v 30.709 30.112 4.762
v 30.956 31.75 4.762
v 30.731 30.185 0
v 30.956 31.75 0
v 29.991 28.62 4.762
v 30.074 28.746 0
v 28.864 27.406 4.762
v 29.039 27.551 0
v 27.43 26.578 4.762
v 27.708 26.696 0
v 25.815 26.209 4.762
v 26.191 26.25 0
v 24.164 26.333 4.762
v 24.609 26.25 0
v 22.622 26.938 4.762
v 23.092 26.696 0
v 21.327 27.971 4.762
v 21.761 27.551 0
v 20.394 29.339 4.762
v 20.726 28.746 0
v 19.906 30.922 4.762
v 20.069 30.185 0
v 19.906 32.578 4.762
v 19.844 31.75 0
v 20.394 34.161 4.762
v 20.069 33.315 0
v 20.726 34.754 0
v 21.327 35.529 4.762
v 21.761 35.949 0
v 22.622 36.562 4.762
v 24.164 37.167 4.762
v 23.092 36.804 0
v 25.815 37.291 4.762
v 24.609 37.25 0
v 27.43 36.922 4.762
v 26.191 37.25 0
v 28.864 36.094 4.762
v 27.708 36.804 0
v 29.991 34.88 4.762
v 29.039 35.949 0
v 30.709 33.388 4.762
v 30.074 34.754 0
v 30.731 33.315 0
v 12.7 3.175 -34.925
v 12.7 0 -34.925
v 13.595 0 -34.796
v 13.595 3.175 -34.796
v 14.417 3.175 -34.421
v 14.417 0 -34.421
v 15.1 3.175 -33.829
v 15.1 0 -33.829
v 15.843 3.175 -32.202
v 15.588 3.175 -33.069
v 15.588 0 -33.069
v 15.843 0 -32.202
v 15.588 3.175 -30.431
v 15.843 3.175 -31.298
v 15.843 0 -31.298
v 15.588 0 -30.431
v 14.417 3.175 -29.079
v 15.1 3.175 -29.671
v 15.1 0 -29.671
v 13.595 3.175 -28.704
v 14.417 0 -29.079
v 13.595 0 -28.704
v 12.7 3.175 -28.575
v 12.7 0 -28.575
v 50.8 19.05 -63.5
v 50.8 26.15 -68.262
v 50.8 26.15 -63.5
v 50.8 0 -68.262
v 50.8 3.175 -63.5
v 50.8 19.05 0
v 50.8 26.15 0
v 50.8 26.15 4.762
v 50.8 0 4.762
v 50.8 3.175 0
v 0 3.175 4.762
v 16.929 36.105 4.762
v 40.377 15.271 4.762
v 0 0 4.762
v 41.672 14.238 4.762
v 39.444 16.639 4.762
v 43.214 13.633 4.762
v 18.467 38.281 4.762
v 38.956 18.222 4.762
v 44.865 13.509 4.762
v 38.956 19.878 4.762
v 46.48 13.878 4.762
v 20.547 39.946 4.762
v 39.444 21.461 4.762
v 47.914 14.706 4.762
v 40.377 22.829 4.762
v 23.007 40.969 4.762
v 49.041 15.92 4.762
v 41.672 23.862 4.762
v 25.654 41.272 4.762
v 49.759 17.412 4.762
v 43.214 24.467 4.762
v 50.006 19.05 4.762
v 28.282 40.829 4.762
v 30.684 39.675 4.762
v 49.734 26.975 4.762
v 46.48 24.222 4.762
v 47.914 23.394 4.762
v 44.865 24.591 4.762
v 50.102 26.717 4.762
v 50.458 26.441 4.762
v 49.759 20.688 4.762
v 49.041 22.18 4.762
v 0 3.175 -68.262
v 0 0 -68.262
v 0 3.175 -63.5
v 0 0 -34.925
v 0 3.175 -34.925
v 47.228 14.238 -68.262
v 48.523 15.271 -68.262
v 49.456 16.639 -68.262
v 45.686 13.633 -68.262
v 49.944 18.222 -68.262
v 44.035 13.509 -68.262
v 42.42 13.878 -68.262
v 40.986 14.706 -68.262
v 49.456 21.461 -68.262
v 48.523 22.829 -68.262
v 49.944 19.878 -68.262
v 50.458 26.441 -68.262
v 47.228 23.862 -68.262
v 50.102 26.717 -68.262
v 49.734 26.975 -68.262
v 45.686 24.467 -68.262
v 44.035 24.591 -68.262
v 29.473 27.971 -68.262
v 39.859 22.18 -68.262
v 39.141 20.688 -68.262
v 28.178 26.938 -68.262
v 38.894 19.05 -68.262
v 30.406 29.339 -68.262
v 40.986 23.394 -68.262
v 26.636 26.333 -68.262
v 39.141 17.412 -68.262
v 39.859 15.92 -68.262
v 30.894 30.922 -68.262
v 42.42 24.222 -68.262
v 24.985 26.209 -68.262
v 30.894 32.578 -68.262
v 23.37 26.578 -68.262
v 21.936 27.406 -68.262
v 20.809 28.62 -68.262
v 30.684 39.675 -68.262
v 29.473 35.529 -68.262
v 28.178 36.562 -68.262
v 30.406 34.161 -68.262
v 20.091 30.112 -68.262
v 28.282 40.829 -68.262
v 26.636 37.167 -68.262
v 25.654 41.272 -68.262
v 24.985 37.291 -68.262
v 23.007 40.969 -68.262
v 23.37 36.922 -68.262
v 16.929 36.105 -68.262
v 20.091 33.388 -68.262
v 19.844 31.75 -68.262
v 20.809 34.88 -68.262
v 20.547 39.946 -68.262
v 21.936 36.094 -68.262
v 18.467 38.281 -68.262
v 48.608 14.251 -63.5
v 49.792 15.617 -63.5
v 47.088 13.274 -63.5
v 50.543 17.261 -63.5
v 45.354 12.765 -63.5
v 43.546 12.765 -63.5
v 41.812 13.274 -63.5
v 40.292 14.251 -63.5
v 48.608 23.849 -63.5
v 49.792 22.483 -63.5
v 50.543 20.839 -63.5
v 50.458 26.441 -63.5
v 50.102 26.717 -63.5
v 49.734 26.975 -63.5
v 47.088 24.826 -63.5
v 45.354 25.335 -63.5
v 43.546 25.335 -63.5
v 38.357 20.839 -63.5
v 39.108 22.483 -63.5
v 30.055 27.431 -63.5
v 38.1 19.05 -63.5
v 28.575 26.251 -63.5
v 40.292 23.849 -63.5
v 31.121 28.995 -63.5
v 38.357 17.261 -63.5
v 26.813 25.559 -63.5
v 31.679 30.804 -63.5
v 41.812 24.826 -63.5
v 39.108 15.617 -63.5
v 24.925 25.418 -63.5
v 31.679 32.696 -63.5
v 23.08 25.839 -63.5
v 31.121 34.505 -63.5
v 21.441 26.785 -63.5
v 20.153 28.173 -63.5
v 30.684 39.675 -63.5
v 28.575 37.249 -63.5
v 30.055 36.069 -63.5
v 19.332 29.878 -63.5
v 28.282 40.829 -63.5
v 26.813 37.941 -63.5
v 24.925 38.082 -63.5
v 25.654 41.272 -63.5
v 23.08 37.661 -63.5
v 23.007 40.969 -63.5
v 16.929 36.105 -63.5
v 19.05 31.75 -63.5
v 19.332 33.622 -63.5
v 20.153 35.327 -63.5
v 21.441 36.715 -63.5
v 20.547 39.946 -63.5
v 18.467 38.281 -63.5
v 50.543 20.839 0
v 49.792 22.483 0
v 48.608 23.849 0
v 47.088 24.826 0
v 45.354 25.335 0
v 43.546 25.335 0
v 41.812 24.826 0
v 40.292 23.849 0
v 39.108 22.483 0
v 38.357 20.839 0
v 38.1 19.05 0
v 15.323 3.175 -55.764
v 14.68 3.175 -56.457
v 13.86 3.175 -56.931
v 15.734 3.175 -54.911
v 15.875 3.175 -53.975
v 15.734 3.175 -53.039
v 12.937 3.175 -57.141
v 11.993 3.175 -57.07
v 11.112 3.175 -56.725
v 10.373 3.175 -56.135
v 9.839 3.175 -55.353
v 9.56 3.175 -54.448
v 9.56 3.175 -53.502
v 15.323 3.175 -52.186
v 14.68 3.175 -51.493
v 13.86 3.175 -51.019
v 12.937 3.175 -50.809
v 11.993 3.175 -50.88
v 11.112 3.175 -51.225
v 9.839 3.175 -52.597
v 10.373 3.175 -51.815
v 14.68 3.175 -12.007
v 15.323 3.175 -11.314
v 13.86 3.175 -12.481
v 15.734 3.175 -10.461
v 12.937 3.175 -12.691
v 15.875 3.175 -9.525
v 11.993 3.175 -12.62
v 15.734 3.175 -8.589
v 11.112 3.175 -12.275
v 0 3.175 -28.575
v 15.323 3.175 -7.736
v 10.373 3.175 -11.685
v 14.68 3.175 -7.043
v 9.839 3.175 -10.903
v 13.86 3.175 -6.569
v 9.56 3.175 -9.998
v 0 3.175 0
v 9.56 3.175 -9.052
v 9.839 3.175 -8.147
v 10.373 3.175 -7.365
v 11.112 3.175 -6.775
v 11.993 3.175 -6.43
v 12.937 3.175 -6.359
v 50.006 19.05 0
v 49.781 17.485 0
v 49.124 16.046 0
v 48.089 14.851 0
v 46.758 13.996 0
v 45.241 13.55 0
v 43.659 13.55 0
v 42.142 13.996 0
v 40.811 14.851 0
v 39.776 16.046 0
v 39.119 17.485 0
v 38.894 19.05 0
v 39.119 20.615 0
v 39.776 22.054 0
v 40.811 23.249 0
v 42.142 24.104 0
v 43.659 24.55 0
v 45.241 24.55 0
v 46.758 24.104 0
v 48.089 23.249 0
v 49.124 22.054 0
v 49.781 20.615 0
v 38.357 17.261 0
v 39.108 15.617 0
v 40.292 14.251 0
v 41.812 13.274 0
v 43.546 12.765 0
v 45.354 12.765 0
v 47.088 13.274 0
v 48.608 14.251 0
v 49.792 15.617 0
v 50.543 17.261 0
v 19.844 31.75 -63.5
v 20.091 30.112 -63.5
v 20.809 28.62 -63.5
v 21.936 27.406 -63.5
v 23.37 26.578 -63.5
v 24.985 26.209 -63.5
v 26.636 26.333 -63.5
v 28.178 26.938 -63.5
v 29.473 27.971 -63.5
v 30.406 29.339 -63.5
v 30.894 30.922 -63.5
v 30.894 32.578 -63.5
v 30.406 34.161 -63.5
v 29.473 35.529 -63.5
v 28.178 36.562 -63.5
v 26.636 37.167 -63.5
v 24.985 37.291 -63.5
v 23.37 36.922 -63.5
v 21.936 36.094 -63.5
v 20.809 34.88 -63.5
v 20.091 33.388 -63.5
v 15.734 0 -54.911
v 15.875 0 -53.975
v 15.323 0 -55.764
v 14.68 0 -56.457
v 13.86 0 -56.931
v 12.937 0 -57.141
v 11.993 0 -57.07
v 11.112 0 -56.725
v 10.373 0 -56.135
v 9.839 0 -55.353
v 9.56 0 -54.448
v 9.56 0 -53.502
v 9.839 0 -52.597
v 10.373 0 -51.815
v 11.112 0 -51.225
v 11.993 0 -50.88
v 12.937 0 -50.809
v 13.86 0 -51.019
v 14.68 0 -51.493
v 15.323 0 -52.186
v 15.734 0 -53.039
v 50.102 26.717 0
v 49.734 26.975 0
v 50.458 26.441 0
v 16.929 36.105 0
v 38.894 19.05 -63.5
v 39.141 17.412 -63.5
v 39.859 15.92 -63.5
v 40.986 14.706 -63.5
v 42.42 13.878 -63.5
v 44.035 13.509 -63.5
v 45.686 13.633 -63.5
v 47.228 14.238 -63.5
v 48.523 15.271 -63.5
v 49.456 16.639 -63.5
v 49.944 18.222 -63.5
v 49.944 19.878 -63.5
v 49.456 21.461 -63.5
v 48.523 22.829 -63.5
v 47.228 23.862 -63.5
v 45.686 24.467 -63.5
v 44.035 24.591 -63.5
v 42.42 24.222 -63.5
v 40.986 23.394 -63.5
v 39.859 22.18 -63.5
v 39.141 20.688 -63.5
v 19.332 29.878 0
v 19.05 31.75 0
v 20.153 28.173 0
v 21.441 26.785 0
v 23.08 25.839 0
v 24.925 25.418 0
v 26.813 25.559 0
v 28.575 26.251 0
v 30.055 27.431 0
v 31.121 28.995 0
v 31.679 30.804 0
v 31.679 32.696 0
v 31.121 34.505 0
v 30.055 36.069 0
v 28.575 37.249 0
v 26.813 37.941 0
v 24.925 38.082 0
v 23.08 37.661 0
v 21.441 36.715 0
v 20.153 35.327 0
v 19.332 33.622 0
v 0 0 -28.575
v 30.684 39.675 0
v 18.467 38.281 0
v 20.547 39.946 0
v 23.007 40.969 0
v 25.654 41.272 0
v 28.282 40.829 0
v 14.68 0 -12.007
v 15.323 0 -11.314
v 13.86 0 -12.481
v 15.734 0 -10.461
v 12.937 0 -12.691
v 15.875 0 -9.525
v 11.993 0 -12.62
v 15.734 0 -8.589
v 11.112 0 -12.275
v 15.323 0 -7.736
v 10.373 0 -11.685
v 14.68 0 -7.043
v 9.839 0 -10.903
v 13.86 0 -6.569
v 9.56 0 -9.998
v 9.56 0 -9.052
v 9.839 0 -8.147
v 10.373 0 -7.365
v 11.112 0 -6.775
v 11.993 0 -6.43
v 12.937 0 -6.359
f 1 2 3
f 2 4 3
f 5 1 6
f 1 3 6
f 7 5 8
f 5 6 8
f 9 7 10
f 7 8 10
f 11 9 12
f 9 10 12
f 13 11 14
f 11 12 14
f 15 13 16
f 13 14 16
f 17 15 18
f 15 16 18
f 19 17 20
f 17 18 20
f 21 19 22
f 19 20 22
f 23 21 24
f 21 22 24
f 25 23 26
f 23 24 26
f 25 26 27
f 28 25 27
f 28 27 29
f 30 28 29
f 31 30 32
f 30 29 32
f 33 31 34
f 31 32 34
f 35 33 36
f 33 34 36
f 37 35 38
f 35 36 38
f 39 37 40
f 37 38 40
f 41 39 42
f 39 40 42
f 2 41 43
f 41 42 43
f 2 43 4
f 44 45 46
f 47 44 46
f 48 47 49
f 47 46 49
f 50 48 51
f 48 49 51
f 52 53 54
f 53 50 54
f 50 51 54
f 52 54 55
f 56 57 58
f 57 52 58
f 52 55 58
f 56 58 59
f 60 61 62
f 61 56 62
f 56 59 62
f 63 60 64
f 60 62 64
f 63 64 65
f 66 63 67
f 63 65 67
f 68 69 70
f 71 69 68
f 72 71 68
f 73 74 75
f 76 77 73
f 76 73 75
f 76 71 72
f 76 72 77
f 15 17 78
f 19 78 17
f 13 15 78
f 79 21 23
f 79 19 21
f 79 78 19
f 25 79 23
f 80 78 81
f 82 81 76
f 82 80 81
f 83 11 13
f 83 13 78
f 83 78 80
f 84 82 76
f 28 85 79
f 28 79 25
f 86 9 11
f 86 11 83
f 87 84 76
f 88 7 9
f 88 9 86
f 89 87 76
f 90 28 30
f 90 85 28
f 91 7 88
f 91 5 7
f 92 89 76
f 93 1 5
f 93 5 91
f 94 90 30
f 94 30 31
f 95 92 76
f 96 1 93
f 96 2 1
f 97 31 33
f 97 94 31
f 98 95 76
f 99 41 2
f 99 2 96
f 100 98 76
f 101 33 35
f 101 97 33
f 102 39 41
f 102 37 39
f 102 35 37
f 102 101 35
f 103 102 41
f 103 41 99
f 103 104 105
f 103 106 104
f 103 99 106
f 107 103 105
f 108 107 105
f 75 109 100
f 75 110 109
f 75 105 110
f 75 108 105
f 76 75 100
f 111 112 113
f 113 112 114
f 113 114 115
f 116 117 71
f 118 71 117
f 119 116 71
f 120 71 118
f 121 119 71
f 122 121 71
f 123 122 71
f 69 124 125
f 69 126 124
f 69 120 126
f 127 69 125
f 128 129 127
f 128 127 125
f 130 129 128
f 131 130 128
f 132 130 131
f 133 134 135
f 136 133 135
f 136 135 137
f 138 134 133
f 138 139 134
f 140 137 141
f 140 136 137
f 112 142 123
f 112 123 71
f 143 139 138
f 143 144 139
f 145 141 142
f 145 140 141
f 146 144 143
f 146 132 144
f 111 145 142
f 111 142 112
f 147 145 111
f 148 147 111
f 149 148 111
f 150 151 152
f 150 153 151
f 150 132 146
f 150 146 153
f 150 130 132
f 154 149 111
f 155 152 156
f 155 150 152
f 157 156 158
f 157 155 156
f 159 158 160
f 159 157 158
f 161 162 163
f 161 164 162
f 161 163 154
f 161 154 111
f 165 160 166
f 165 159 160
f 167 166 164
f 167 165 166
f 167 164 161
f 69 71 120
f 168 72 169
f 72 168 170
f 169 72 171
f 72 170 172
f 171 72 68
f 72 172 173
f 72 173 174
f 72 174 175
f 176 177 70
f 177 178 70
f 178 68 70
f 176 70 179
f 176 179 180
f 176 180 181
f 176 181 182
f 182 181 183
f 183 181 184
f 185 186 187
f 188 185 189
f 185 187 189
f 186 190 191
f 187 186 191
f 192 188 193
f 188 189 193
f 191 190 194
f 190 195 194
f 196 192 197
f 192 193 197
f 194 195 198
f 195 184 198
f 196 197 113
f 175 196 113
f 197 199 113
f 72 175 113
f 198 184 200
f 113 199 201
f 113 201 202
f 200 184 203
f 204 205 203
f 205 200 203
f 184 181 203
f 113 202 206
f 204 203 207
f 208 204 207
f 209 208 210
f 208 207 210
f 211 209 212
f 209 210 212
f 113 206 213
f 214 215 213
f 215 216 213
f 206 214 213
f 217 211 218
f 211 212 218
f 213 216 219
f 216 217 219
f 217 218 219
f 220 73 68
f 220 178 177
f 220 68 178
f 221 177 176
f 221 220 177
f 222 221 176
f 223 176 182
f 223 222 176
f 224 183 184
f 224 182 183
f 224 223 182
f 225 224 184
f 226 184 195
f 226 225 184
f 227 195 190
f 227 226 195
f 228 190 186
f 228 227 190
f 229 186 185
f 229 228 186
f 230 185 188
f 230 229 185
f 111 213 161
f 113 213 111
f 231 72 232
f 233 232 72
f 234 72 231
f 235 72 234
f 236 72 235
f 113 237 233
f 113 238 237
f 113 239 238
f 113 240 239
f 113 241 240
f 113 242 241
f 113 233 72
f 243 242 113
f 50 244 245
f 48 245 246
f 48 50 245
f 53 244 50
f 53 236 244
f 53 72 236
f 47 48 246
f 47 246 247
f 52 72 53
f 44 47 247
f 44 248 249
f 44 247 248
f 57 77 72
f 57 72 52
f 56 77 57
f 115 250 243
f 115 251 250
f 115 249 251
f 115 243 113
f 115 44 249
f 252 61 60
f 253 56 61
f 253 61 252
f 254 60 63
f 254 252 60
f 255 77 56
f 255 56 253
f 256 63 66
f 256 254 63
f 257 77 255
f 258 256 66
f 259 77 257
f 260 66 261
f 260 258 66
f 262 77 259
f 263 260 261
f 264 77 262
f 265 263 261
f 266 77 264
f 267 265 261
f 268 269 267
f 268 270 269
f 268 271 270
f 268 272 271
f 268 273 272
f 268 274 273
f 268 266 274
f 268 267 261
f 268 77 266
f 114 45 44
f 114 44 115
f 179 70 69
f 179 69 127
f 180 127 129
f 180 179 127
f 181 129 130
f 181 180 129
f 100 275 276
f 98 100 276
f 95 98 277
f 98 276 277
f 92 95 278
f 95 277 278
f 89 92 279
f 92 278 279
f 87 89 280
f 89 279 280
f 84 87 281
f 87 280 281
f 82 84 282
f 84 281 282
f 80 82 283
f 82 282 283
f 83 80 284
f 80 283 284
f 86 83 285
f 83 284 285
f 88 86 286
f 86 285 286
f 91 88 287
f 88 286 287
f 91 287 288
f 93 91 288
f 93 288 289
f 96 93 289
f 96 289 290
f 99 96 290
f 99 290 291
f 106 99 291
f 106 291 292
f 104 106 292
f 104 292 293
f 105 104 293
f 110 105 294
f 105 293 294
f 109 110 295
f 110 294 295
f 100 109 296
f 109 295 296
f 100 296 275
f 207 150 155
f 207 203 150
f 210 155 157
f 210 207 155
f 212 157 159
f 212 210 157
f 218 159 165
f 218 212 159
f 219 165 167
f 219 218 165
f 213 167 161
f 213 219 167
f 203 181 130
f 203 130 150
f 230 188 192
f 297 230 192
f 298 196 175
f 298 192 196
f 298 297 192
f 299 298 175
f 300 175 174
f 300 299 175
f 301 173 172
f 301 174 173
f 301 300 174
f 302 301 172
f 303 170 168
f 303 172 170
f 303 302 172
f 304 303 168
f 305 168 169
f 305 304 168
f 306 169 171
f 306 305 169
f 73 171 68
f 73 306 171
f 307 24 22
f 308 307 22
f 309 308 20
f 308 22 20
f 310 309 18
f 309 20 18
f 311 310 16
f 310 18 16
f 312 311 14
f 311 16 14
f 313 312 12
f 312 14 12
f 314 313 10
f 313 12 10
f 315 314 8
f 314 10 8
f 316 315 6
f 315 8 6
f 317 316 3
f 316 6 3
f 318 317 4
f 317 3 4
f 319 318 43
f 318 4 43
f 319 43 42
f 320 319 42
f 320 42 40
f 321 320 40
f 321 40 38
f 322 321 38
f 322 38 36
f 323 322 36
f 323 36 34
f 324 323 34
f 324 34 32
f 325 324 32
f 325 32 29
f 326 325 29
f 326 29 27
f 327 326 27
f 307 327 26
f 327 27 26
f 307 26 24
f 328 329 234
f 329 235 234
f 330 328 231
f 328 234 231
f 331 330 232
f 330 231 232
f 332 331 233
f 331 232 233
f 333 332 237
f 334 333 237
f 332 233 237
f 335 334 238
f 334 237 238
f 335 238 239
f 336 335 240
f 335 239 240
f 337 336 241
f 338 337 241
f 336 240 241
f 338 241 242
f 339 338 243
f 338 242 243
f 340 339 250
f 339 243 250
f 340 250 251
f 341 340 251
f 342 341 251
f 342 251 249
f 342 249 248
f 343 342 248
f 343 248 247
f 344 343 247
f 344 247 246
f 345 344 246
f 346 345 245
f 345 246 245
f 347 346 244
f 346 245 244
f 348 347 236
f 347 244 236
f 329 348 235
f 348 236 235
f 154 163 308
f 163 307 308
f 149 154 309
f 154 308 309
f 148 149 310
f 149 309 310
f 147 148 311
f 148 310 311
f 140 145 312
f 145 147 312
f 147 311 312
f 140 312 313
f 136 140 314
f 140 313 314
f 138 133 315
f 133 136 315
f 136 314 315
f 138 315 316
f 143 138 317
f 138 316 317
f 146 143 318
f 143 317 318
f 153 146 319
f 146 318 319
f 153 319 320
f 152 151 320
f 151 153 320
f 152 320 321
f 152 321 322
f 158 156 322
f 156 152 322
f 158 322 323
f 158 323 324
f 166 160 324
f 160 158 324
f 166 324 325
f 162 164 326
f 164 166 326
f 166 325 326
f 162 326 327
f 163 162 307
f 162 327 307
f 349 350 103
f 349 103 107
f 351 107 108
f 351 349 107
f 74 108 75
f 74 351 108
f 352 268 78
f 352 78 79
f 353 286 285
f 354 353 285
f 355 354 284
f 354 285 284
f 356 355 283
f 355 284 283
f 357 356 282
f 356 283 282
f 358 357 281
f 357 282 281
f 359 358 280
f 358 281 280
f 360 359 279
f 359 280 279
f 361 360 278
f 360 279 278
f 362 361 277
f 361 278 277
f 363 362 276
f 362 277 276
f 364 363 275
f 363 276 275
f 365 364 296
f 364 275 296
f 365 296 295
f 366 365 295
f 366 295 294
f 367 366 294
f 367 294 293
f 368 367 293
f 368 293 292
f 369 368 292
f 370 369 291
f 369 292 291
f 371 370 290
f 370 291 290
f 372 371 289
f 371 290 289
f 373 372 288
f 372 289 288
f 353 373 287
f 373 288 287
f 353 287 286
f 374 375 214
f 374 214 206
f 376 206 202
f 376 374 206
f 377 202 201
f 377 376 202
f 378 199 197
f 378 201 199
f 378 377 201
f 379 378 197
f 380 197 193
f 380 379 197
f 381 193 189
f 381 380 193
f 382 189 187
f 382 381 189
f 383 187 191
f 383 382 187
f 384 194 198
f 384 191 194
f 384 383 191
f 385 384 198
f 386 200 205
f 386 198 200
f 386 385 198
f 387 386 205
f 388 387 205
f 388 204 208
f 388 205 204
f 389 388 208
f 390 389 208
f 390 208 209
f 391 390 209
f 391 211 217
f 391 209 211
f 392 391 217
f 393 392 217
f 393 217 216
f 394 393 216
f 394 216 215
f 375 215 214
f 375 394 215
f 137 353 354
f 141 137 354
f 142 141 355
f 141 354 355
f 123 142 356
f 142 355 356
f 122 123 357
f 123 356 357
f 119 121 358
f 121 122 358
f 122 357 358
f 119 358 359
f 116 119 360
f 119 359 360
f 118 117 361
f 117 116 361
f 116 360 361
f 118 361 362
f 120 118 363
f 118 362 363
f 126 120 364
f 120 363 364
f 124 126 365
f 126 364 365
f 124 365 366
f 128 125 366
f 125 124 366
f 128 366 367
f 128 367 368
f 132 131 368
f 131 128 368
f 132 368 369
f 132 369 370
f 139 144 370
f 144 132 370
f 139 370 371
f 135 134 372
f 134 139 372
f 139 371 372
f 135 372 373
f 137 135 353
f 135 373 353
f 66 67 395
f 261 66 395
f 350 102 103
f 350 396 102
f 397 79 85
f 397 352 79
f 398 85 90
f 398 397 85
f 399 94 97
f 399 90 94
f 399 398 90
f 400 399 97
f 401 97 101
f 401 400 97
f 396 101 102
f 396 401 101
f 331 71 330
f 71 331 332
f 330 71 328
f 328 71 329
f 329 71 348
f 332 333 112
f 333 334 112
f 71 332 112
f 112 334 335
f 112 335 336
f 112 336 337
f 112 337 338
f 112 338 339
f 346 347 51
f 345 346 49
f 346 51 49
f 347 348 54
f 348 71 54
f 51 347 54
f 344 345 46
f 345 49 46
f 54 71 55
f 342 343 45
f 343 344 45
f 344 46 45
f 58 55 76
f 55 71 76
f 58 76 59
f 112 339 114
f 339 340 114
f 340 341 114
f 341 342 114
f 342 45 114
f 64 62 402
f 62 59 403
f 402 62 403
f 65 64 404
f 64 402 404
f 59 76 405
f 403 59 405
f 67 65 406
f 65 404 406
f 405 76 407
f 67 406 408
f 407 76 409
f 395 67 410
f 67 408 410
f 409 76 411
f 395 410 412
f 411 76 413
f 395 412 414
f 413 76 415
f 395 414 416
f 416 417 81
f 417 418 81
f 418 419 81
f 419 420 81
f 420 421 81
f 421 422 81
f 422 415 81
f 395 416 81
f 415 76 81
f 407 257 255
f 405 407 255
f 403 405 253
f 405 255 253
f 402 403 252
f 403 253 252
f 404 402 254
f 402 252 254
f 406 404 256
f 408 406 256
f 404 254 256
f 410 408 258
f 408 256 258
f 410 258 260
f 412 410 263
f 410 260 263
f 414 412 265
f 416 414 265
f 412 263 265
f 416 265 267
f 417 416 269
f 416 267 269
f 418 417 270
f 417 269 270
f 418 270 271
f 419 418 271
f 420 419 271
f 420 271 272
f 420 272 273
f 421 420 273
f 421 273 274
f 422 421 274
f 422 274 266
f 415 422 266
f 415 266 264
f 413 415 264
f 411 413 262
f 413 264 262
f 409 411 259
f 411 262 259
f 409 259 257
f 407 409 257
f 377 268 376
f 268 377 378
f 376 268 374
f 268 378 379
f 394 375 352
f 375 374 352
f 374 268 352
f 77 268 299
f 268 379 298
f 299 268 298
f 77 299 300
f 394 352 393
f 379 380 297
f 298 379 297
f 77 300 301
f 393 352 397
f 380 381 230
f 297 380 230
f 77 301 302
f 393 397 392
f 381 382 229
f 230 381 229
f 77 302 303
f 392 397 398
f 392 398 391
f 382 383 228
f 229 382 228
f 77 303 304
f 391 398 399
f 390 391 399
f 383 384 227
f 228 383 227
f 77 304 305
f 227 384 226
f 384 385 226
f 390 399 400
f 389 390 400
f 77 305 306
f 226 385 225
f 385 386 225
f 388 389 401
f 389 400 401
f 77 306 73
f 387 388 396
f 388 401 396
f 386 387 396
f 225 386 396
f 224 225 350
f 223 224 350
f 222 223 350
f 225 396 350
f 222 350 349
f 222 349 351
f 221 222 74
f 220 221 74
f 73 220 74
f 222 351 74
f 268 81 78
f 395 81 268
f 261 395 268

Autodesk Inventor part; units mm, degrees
ref_plane "YZ Plane" through (0, 0, 0) normal (1, 0, 0) x (0, 1, 0)
ref_plane "XZ Plane" through (0, 0, 0) normal (0, 1, 0) x (-1, 0, 0)
ref_plane "XY Plane" through (0, 0, 0) normal (0, 0, 1) x (1, 0, 0)
sketch "Sketch1" plane through (0, 0, 0) normal (0, 1, 0) x (-1, 0, 0)
  line L0 (0, 0) -> (-76.2, 0)
  line L1 (-76.2, 0) -> (-76.2, -63.5) construction
  line L2 (-76.2, -63.5) -> (0, -63.5)
  line L3 (0, -63.5) -> (0, 0) construction
  line L4 (0, -31.75) -> (44.45, -31.75) construction
  line L5 (-76.2, -31.75) -> (-127, -31.75) construction
  circle A0 centre (44.45, -31.75) radius 3.175
  circle A1 centre (-127, -31.75) radius 3.175 construction
  circle A2 centre (-114.3, -31.75) radius 3.175 construction
  line L6 (-114.3, -34.925) -> (-127, -34.925)
  line L7 (-114.3, -28.575) -> (-127, -28.575)
  arc A3 (-114.3, -34.925) -> (-114.3, -28.575) centre (-114.3, -31.75) ccw
  arc A4 (-127, -28.575) -> (-127, -34.925) centre (-127, -31.75) ccw
  line L8 (0, -63.5) -> (47.5152, -37.3112)
  line L9 (47.5152, -26.1888) -> (0, 0)
  line L10 (-76.2, -63.5) -> (-129.7757, -37.4612)
  line L11 (-129.7757, -26.0388) -> (-76.2, 0)
  arc A5 (47.5152, -37.3112) -> (47.5152, -26.1888) centre (44.45, -31.75) ccw
  arc A6 (-129.7757, -26.0388) -> (-129.7757, -37.4612) centre (-127, -31.75) ccw
  circle A7 centre (-76.2, -31.75) radius 3.175 construction
  circle A8 centre (-63.5, -31.75) radius 3.175 construction
  line L12 (-76.2, -28.575) -> (-63.5, -28.575) construction
  line L13 (-76.2, -34.925) -> (-63.5, -34.925) construction
  line L14 (-63.5, -28.575) -> (-76.2, -28.575)
  line L15 (-76.2, -34.925) -> (-63.5, -34.925)
  arc A9 (-63.5, -34.925) -> (-63.5, -28.575) centre (-63.5, -31.75) ccw
  arc A10 (-76.2, -28.575) -> (-76.2, -34.925) centre (-76.2, -31.75) ccw
  circle A11 centre (0, -31.75) radius 3.175 construction
  circle A12 centre (-12.7, -31.75) radius 3.175 construction
  line L16 (0, -28.575) -> (-12.7, -28.575) construction
  line L17 (0, -34.925) -> (-12.7, -34.925) construction
  arc A13 (-12.7, -28.575) -> (-12.7, -34.925) centre (-12.7, -31.75) ccw
  arc A14 (0, -34.925) -> (0, -28.575) centre (0, -31.75) ccw
  line L18 (-12.7, -34.925) -> (0, -34.925)
  line L19 (-12.7, -28.575) -> (0, -28.575)
  dimension "d0" = 76.2
  dimension "d1" = 63.5
  dimension "d2" = 44.45
  dimension "d3" = 50.8
  dimension "d4" = 6.35
  dimension "d5" = 6.35
  dimension "d6" = 6.35
  dimension "d7" = 12.7
  dimension "d8" = 6.35
  dimension "d9" = 0
  dimension "d10" = 0
  dimension "d11" = 0
  dimension "d12" = 0
  dimension "d13" = 6.35
  dimension "d14" = 6.35
  dimension "d15" = 12.7
  dimension "d16" = 0
  dimension "d17" = 6.35
  dimension "d18" = 6.35
  dimension "d19" = 0
  dimension "d20" = 12.7
extrude "Extrusion1" add sketch "Sketch1" along normal blind 3.175
sketch "Sketch2" plane through (0, 0, 0) normal (0, 0, 1) x (1, 0, 0)
  line L0 (0, 0) -> (76.2, 0) projected
  line L1 (76.2, 0) -> (76.2, 3.175) projected
  line L2 (0, 3.175) -> (76.2, 3.175) projected
  line L3 (0, 0) -> (0, 3.175) projected
  circle A0 centre (25.4, 31.75) radius 5.5562
  circle A1 centre (44.45, 19.05) radius 5.5563
  line L4 (0, 3.175) -> (16.9289, 36.1049)
  line L5 (30.6835, 39.6753) -> (49.7335, 26.9753)
  line L6 (50.8395, 26.114) -> (76.2, 3.175)
  arc A2 (30.6835, 39.6753) -> (16.9289, 36.1049) centre (25.4, 31.75) ccw
  arc A3 (50.8395, 26.114) -> (49.7335, 26.9753) centre (44.45, 19.05) ccw
  dimension "d23" = 11.1125
  dimension "d24" = 31.75
  dimension "d25" = 25.4
  dimension "d26" = 11.1125
  dimension "d27" = 19.05
  dimension "d28" = 31.75
  dimension "d29" = 9.525
extrude "Extrusion2" add sketch "Sketch2" along normal blind 4.7625
sketch "Sketch3" plane through (76.2, 0, -63.5) normal (0, 0, -1) x (-1, 0, 0)
  line L0 (0, 0) -> (76.2, 0) projected
  line L1 (76.2, 0) -> (76.2, 3.175) projected
  line L2 (0, 3.175) -> (76.2, 3.175) projected
  line L3 (0, 0) -> (0, 3.175) projected
  line L4 (59.2711, 36.1049) -> (76.2, 3.175) projected
  arc A0 (59.2711, 36.1049) -> (45.5165, 39.6753) centre (50.8, 31.75) ccw projected
  line L5 (26.4665, 26.9753) -> (45.5165, 39.6753) projected
  arc A1 (26.4665, 26.9753) -> (25.3605, 26.114) centre (31.75, 19.05) ccw projected
  line L6 (0, 3.175) -> (25.3605, 26.114) projected
  circle A2 centre (31.75, 19.05) radius 5.5563 projected
  circle A3 centre (50.8, 31.75) radius 5.5562 projected
  line L7 (76.2, 0) -> (0, 0) projected
  line L8 (0, 0) -> (0, 3.175) projected
  line L9 (76.2, 3.175) -> (76.2, 0) projected
extrude "Extrusion3" add sketch "Sketch3" along normal blind 4.7625
sketch "Sketch5" plane through (0, 0, 0) normal (0, 0, -1) x (-1, 0, 0)
  line L0 (0, 3.175) -> (-76.2, 3.175) projected
  line L1 (-16.9289, 36.1049) -> (0, 3.175) projected
  arc A0 (-16.9289, 36.1049) -> (-30.6835, 39.6753) centre (-25.4, 31.75) ccw projected
  line L2 (-49.7335, 26.9753) -> (-30.6835, 39.6753) projected
  arc A1 (-49.7335, 26.9753) -> (-50.8395, 26.114) centre (-44.45, 19.05) ccw projected
  line L3 (-76.2, 3.175) -> (-50.8395, 26.114) projected
  circle A2 centre (-44.45, 19.05) radius 5.5563 projected
  circle A3 centre (-25.4, 31.75) radius 5.5562 projected
  circle A4 centre (-44.45, 19.05) radius 6.35
  circle A5 centre (-25.4, 31.75) radius 6.35
  point P0 (0, 0)
  dimension "d38" = 12.7
  dimension "d39" = 12.7
extrude "Extrusion5" add sketch "Sketch5" along normal blind 63.5 contours A4 | A5
sketch "Sketch6" plane through (0, 3.175, 0) normal (0, 1, 0) x (1, 0, 0)
  line L0 (0, 34.925) -> (12.7, 34.925) projected
  arc A0 (12.7, 28.575) -> (12.7, 34.925) centre (12.7, 31.75) ccw projected
  line L1 (12.7, 28.575) -> (0, 28.575) projected
  arc A1 (0, 34.925) -> (0, 28.575) centre (0, 31.75) ccw projected
  arc A2 (63.5, 34.925) -> (63.5, 28.575) centre (63.5, 31.75) ccw projected
  line L2 (63.5, 34.925) -> (76.2, 34.925) projected
  arc A3 (76.2, 28.575) -> (76.2, 34.925) centre (76.2, 31.75) ccw projected
  line L3 (76.2, 28.575) -> (63.5, 28.575) projected
  arc A4 (127, 28.575) -> (127, 34.925) centre (127, 31.75) ccw projected
  line L4 (127, 28.575) -> (114.3, 28.575) projected
  arc A5 (114.3, 34.925) -> (114.3, 28.575) centre (114.3, 31.75) ccw projected
  line L5 (114.3, 34.925) -> (127, 34.925) projected
  circle A6 centre (-44.45, 31.75) radius 3.175 projected
  line L6 (0, 0) -> (76.2, 0) projected
  line L7 (76.2, 0) -> (129.7757, 26.0388) projected
  arc A7 (129.7757, 26.0388) -> (129.7757, 37.4612) centre (127, 31.75) ccw projected
  line L8 (129.7757, 37.4612) -> (76.2, 63.5) projected
  line L9 (76.2, 63.5) -> (0, 63.5) projected
  line L10 (0, 63.5) -> (-47.5152, 37.3112) projected
  arc A8 (-47.5152, 37.3112) -> (-47.5152, 26.1888) centre (-44.45, 31.75) ccw projected
  line L11 (-47.5152, 26.1888) -> (0, 0) projected
  circle A9 centre (88.9, 31.75) radius 3.175
  circle A10 centre (63.5, 9.525) radius 3.175
  circle A11 centre (63.5, 53.975) radius 3.175
  circle A12 centre (-12.7, 31.75) radius 3.175
  circle A13 centre (12.7, 9.525) radius 3.175
  circle A14 centre (12.7, 53.975) radius 3.175
  dimension "d42" = 6.35
  dimension "d43" = 6.35
  dimension "d44" = 6.35
  dimension "d45" = 6.35
  dimension "d46" = 6.35
  dimension "d47" = 6.35
  dimension "d50" = 22.225
  dimension "d51" = 22.225
  dimension "d52" = 0
  dimension "d53" = 0
  dimension "d54" = 0
  dimension "d55" = 12.7
  dimension "d56" = 12.7
  dimension "d57" = 0
  dimension "d58" = 0
  dimension "d59" = 0
  dimension "d60" = 22.225
  dimension "d61" = 22.225
extrude "Extrusion6" cut sketch "Sketch6" against normal blind 63.5 contours A9 | A10 | A11 | A12 | A13 | A14
sketch "Sketch7" plane through (0, 0, 0) normal (0, -1, 0) x (1, 0, 0)
  circle A0 centre (12.7, -9.525) radius 3.175 projected
  circle A1 centre (63.5, -53.975) radius 3.175 projected
  circle A2 centre (88.9, -31.75) radius 3.175 projected
  circle A3 centre (63.5, -9.525) radius 3.175 projected
  circle A4 centre (-12.7, -31.75) radius 3.175 projected
  circle A5 centre (12.7, -53.975) radius 3.175 projected
  line L0 (12.7, -34.925) -> (0, -34.925) projected
  arc A6 (0, -28.575) -> (0, -34.925) centre (0, -31.75) ccw projected
  line L1 (0, -28.575) -> (12.7, -28.575) projected
  arc A7 (12.7, -34.925) -> (12.7, -28.575) centre (12.7, -31.75) ccw projected
  arc A8 (63.5, -28.575) -> (63.5, -34.925) centre (63.5, -31.75) ccw projected
  line L2 (63.5, -28.575) -> (76.2, -28.575) projected
  arc A9 (76.2, -34.925) -> (76.2, -28.575) centre (76.2, -31.75) ccw projected
  line L3 (76.2, -34.925) -> (63.5, -34.925) projected
  arc A10 (127, -34.925) -> (127, -28.575) centre (127, -31.75) ccw projected
  line L4 (127, -34.925) -> (114.3, -34.925) projected
  arc A11 (114.3, -28.575) -> (114.3, -34.925) centre (114.3, -31.75) ccw projected
  line L5 (114.3, -28.575) -> (127, -28.575) projected
  circle A12 centre (-44.45, -31.75) radius 3.175 projected
  line L6 (-47.5152, -26.1888) -> (0, 0) projected
  arc A13 (-47.5152, -26.1888) -> (-47.5152, -37.3112) centre (-44.45, -31.75) ccw projected
  line L7 (0, -63.5) -> (-47.5152, -37.3112) projected
  line L8 (129.7757, -37.4612) -> (76.2, -63.5) projected
  arc A14 (129.7757, -37.4612) -> (129.7757, -26.0388) centre (127, -31.75) ccw projected
  line L9 (76.2, 0) -> (129.7757, -26.0388) projected
  line L10 (76.2, 0) -> (76.2, 4.7625) projected
  line L11 (0, 4.7625) -> (76.2, 4.7625) projected
  line L12 (0, 0) -> (0, 4.7625) projected
  line L13 (76.2, 4.7625) -> (50.8, 4.7625) construction
  line L14 (0, 4.7625) -> (76.2, 4.7625) construction
  line L15 (50.8, 4.7625) -> (133.35, 4.7625)
  line L16 (133.35, 4.7625) -> (133.35, -71.4375)
  line L17 (133.35, -71.4375) -> (50.8, -71.4375)
  line L18 (50.8, -71.4375) -> (50.8, 4.7625)
  line L19 (0, -63.5) -> (0, -68.2625) projected
  line L20 (76.2, -68.2625) -> (0, -68.2625) projected
  line L21 (76.2, -63.5) -> (76.2, -68.2625) projected
  dimension "d64" = 25.4
  dimension "d65" = 82.55
  dimension "d66" = 76.2
extrude "Extrusion7" cut sketch "Sketch7" against normal blind 63.5 contours L11 L10 L9 A14 L8 L21 L20 L18 | L15 L16 A14 L9 L10 | L20 L21 L8 A14 L16 L17 L18
sketch "Sketch8" plane through (0, 3.175, 0) normal (0, 1, 0) x (1, 0, 0)
  circle A0 centre (-44.45, 31.75) radius 3.175 projected
  circle A1 centre (-12.7, 31.75) radius 3.175 projected
  line L0 (0, 63.5) -> (-63.5, 63.5)
  line L1 (-63.5, 63.5) -> (-63.5, 0)
  line L2 (-63.5, 0) -> (0, 0)
  line L3 (0, 0) -> (0, 63.5)
  dimension "d69" = 63.5
  dimension "d70" = 63.5
extrude "Extrusion8" cut sketch "Sketch8" against normal blind 25.4
properties part number "garage door hinge" material "Aluminum 6061"
